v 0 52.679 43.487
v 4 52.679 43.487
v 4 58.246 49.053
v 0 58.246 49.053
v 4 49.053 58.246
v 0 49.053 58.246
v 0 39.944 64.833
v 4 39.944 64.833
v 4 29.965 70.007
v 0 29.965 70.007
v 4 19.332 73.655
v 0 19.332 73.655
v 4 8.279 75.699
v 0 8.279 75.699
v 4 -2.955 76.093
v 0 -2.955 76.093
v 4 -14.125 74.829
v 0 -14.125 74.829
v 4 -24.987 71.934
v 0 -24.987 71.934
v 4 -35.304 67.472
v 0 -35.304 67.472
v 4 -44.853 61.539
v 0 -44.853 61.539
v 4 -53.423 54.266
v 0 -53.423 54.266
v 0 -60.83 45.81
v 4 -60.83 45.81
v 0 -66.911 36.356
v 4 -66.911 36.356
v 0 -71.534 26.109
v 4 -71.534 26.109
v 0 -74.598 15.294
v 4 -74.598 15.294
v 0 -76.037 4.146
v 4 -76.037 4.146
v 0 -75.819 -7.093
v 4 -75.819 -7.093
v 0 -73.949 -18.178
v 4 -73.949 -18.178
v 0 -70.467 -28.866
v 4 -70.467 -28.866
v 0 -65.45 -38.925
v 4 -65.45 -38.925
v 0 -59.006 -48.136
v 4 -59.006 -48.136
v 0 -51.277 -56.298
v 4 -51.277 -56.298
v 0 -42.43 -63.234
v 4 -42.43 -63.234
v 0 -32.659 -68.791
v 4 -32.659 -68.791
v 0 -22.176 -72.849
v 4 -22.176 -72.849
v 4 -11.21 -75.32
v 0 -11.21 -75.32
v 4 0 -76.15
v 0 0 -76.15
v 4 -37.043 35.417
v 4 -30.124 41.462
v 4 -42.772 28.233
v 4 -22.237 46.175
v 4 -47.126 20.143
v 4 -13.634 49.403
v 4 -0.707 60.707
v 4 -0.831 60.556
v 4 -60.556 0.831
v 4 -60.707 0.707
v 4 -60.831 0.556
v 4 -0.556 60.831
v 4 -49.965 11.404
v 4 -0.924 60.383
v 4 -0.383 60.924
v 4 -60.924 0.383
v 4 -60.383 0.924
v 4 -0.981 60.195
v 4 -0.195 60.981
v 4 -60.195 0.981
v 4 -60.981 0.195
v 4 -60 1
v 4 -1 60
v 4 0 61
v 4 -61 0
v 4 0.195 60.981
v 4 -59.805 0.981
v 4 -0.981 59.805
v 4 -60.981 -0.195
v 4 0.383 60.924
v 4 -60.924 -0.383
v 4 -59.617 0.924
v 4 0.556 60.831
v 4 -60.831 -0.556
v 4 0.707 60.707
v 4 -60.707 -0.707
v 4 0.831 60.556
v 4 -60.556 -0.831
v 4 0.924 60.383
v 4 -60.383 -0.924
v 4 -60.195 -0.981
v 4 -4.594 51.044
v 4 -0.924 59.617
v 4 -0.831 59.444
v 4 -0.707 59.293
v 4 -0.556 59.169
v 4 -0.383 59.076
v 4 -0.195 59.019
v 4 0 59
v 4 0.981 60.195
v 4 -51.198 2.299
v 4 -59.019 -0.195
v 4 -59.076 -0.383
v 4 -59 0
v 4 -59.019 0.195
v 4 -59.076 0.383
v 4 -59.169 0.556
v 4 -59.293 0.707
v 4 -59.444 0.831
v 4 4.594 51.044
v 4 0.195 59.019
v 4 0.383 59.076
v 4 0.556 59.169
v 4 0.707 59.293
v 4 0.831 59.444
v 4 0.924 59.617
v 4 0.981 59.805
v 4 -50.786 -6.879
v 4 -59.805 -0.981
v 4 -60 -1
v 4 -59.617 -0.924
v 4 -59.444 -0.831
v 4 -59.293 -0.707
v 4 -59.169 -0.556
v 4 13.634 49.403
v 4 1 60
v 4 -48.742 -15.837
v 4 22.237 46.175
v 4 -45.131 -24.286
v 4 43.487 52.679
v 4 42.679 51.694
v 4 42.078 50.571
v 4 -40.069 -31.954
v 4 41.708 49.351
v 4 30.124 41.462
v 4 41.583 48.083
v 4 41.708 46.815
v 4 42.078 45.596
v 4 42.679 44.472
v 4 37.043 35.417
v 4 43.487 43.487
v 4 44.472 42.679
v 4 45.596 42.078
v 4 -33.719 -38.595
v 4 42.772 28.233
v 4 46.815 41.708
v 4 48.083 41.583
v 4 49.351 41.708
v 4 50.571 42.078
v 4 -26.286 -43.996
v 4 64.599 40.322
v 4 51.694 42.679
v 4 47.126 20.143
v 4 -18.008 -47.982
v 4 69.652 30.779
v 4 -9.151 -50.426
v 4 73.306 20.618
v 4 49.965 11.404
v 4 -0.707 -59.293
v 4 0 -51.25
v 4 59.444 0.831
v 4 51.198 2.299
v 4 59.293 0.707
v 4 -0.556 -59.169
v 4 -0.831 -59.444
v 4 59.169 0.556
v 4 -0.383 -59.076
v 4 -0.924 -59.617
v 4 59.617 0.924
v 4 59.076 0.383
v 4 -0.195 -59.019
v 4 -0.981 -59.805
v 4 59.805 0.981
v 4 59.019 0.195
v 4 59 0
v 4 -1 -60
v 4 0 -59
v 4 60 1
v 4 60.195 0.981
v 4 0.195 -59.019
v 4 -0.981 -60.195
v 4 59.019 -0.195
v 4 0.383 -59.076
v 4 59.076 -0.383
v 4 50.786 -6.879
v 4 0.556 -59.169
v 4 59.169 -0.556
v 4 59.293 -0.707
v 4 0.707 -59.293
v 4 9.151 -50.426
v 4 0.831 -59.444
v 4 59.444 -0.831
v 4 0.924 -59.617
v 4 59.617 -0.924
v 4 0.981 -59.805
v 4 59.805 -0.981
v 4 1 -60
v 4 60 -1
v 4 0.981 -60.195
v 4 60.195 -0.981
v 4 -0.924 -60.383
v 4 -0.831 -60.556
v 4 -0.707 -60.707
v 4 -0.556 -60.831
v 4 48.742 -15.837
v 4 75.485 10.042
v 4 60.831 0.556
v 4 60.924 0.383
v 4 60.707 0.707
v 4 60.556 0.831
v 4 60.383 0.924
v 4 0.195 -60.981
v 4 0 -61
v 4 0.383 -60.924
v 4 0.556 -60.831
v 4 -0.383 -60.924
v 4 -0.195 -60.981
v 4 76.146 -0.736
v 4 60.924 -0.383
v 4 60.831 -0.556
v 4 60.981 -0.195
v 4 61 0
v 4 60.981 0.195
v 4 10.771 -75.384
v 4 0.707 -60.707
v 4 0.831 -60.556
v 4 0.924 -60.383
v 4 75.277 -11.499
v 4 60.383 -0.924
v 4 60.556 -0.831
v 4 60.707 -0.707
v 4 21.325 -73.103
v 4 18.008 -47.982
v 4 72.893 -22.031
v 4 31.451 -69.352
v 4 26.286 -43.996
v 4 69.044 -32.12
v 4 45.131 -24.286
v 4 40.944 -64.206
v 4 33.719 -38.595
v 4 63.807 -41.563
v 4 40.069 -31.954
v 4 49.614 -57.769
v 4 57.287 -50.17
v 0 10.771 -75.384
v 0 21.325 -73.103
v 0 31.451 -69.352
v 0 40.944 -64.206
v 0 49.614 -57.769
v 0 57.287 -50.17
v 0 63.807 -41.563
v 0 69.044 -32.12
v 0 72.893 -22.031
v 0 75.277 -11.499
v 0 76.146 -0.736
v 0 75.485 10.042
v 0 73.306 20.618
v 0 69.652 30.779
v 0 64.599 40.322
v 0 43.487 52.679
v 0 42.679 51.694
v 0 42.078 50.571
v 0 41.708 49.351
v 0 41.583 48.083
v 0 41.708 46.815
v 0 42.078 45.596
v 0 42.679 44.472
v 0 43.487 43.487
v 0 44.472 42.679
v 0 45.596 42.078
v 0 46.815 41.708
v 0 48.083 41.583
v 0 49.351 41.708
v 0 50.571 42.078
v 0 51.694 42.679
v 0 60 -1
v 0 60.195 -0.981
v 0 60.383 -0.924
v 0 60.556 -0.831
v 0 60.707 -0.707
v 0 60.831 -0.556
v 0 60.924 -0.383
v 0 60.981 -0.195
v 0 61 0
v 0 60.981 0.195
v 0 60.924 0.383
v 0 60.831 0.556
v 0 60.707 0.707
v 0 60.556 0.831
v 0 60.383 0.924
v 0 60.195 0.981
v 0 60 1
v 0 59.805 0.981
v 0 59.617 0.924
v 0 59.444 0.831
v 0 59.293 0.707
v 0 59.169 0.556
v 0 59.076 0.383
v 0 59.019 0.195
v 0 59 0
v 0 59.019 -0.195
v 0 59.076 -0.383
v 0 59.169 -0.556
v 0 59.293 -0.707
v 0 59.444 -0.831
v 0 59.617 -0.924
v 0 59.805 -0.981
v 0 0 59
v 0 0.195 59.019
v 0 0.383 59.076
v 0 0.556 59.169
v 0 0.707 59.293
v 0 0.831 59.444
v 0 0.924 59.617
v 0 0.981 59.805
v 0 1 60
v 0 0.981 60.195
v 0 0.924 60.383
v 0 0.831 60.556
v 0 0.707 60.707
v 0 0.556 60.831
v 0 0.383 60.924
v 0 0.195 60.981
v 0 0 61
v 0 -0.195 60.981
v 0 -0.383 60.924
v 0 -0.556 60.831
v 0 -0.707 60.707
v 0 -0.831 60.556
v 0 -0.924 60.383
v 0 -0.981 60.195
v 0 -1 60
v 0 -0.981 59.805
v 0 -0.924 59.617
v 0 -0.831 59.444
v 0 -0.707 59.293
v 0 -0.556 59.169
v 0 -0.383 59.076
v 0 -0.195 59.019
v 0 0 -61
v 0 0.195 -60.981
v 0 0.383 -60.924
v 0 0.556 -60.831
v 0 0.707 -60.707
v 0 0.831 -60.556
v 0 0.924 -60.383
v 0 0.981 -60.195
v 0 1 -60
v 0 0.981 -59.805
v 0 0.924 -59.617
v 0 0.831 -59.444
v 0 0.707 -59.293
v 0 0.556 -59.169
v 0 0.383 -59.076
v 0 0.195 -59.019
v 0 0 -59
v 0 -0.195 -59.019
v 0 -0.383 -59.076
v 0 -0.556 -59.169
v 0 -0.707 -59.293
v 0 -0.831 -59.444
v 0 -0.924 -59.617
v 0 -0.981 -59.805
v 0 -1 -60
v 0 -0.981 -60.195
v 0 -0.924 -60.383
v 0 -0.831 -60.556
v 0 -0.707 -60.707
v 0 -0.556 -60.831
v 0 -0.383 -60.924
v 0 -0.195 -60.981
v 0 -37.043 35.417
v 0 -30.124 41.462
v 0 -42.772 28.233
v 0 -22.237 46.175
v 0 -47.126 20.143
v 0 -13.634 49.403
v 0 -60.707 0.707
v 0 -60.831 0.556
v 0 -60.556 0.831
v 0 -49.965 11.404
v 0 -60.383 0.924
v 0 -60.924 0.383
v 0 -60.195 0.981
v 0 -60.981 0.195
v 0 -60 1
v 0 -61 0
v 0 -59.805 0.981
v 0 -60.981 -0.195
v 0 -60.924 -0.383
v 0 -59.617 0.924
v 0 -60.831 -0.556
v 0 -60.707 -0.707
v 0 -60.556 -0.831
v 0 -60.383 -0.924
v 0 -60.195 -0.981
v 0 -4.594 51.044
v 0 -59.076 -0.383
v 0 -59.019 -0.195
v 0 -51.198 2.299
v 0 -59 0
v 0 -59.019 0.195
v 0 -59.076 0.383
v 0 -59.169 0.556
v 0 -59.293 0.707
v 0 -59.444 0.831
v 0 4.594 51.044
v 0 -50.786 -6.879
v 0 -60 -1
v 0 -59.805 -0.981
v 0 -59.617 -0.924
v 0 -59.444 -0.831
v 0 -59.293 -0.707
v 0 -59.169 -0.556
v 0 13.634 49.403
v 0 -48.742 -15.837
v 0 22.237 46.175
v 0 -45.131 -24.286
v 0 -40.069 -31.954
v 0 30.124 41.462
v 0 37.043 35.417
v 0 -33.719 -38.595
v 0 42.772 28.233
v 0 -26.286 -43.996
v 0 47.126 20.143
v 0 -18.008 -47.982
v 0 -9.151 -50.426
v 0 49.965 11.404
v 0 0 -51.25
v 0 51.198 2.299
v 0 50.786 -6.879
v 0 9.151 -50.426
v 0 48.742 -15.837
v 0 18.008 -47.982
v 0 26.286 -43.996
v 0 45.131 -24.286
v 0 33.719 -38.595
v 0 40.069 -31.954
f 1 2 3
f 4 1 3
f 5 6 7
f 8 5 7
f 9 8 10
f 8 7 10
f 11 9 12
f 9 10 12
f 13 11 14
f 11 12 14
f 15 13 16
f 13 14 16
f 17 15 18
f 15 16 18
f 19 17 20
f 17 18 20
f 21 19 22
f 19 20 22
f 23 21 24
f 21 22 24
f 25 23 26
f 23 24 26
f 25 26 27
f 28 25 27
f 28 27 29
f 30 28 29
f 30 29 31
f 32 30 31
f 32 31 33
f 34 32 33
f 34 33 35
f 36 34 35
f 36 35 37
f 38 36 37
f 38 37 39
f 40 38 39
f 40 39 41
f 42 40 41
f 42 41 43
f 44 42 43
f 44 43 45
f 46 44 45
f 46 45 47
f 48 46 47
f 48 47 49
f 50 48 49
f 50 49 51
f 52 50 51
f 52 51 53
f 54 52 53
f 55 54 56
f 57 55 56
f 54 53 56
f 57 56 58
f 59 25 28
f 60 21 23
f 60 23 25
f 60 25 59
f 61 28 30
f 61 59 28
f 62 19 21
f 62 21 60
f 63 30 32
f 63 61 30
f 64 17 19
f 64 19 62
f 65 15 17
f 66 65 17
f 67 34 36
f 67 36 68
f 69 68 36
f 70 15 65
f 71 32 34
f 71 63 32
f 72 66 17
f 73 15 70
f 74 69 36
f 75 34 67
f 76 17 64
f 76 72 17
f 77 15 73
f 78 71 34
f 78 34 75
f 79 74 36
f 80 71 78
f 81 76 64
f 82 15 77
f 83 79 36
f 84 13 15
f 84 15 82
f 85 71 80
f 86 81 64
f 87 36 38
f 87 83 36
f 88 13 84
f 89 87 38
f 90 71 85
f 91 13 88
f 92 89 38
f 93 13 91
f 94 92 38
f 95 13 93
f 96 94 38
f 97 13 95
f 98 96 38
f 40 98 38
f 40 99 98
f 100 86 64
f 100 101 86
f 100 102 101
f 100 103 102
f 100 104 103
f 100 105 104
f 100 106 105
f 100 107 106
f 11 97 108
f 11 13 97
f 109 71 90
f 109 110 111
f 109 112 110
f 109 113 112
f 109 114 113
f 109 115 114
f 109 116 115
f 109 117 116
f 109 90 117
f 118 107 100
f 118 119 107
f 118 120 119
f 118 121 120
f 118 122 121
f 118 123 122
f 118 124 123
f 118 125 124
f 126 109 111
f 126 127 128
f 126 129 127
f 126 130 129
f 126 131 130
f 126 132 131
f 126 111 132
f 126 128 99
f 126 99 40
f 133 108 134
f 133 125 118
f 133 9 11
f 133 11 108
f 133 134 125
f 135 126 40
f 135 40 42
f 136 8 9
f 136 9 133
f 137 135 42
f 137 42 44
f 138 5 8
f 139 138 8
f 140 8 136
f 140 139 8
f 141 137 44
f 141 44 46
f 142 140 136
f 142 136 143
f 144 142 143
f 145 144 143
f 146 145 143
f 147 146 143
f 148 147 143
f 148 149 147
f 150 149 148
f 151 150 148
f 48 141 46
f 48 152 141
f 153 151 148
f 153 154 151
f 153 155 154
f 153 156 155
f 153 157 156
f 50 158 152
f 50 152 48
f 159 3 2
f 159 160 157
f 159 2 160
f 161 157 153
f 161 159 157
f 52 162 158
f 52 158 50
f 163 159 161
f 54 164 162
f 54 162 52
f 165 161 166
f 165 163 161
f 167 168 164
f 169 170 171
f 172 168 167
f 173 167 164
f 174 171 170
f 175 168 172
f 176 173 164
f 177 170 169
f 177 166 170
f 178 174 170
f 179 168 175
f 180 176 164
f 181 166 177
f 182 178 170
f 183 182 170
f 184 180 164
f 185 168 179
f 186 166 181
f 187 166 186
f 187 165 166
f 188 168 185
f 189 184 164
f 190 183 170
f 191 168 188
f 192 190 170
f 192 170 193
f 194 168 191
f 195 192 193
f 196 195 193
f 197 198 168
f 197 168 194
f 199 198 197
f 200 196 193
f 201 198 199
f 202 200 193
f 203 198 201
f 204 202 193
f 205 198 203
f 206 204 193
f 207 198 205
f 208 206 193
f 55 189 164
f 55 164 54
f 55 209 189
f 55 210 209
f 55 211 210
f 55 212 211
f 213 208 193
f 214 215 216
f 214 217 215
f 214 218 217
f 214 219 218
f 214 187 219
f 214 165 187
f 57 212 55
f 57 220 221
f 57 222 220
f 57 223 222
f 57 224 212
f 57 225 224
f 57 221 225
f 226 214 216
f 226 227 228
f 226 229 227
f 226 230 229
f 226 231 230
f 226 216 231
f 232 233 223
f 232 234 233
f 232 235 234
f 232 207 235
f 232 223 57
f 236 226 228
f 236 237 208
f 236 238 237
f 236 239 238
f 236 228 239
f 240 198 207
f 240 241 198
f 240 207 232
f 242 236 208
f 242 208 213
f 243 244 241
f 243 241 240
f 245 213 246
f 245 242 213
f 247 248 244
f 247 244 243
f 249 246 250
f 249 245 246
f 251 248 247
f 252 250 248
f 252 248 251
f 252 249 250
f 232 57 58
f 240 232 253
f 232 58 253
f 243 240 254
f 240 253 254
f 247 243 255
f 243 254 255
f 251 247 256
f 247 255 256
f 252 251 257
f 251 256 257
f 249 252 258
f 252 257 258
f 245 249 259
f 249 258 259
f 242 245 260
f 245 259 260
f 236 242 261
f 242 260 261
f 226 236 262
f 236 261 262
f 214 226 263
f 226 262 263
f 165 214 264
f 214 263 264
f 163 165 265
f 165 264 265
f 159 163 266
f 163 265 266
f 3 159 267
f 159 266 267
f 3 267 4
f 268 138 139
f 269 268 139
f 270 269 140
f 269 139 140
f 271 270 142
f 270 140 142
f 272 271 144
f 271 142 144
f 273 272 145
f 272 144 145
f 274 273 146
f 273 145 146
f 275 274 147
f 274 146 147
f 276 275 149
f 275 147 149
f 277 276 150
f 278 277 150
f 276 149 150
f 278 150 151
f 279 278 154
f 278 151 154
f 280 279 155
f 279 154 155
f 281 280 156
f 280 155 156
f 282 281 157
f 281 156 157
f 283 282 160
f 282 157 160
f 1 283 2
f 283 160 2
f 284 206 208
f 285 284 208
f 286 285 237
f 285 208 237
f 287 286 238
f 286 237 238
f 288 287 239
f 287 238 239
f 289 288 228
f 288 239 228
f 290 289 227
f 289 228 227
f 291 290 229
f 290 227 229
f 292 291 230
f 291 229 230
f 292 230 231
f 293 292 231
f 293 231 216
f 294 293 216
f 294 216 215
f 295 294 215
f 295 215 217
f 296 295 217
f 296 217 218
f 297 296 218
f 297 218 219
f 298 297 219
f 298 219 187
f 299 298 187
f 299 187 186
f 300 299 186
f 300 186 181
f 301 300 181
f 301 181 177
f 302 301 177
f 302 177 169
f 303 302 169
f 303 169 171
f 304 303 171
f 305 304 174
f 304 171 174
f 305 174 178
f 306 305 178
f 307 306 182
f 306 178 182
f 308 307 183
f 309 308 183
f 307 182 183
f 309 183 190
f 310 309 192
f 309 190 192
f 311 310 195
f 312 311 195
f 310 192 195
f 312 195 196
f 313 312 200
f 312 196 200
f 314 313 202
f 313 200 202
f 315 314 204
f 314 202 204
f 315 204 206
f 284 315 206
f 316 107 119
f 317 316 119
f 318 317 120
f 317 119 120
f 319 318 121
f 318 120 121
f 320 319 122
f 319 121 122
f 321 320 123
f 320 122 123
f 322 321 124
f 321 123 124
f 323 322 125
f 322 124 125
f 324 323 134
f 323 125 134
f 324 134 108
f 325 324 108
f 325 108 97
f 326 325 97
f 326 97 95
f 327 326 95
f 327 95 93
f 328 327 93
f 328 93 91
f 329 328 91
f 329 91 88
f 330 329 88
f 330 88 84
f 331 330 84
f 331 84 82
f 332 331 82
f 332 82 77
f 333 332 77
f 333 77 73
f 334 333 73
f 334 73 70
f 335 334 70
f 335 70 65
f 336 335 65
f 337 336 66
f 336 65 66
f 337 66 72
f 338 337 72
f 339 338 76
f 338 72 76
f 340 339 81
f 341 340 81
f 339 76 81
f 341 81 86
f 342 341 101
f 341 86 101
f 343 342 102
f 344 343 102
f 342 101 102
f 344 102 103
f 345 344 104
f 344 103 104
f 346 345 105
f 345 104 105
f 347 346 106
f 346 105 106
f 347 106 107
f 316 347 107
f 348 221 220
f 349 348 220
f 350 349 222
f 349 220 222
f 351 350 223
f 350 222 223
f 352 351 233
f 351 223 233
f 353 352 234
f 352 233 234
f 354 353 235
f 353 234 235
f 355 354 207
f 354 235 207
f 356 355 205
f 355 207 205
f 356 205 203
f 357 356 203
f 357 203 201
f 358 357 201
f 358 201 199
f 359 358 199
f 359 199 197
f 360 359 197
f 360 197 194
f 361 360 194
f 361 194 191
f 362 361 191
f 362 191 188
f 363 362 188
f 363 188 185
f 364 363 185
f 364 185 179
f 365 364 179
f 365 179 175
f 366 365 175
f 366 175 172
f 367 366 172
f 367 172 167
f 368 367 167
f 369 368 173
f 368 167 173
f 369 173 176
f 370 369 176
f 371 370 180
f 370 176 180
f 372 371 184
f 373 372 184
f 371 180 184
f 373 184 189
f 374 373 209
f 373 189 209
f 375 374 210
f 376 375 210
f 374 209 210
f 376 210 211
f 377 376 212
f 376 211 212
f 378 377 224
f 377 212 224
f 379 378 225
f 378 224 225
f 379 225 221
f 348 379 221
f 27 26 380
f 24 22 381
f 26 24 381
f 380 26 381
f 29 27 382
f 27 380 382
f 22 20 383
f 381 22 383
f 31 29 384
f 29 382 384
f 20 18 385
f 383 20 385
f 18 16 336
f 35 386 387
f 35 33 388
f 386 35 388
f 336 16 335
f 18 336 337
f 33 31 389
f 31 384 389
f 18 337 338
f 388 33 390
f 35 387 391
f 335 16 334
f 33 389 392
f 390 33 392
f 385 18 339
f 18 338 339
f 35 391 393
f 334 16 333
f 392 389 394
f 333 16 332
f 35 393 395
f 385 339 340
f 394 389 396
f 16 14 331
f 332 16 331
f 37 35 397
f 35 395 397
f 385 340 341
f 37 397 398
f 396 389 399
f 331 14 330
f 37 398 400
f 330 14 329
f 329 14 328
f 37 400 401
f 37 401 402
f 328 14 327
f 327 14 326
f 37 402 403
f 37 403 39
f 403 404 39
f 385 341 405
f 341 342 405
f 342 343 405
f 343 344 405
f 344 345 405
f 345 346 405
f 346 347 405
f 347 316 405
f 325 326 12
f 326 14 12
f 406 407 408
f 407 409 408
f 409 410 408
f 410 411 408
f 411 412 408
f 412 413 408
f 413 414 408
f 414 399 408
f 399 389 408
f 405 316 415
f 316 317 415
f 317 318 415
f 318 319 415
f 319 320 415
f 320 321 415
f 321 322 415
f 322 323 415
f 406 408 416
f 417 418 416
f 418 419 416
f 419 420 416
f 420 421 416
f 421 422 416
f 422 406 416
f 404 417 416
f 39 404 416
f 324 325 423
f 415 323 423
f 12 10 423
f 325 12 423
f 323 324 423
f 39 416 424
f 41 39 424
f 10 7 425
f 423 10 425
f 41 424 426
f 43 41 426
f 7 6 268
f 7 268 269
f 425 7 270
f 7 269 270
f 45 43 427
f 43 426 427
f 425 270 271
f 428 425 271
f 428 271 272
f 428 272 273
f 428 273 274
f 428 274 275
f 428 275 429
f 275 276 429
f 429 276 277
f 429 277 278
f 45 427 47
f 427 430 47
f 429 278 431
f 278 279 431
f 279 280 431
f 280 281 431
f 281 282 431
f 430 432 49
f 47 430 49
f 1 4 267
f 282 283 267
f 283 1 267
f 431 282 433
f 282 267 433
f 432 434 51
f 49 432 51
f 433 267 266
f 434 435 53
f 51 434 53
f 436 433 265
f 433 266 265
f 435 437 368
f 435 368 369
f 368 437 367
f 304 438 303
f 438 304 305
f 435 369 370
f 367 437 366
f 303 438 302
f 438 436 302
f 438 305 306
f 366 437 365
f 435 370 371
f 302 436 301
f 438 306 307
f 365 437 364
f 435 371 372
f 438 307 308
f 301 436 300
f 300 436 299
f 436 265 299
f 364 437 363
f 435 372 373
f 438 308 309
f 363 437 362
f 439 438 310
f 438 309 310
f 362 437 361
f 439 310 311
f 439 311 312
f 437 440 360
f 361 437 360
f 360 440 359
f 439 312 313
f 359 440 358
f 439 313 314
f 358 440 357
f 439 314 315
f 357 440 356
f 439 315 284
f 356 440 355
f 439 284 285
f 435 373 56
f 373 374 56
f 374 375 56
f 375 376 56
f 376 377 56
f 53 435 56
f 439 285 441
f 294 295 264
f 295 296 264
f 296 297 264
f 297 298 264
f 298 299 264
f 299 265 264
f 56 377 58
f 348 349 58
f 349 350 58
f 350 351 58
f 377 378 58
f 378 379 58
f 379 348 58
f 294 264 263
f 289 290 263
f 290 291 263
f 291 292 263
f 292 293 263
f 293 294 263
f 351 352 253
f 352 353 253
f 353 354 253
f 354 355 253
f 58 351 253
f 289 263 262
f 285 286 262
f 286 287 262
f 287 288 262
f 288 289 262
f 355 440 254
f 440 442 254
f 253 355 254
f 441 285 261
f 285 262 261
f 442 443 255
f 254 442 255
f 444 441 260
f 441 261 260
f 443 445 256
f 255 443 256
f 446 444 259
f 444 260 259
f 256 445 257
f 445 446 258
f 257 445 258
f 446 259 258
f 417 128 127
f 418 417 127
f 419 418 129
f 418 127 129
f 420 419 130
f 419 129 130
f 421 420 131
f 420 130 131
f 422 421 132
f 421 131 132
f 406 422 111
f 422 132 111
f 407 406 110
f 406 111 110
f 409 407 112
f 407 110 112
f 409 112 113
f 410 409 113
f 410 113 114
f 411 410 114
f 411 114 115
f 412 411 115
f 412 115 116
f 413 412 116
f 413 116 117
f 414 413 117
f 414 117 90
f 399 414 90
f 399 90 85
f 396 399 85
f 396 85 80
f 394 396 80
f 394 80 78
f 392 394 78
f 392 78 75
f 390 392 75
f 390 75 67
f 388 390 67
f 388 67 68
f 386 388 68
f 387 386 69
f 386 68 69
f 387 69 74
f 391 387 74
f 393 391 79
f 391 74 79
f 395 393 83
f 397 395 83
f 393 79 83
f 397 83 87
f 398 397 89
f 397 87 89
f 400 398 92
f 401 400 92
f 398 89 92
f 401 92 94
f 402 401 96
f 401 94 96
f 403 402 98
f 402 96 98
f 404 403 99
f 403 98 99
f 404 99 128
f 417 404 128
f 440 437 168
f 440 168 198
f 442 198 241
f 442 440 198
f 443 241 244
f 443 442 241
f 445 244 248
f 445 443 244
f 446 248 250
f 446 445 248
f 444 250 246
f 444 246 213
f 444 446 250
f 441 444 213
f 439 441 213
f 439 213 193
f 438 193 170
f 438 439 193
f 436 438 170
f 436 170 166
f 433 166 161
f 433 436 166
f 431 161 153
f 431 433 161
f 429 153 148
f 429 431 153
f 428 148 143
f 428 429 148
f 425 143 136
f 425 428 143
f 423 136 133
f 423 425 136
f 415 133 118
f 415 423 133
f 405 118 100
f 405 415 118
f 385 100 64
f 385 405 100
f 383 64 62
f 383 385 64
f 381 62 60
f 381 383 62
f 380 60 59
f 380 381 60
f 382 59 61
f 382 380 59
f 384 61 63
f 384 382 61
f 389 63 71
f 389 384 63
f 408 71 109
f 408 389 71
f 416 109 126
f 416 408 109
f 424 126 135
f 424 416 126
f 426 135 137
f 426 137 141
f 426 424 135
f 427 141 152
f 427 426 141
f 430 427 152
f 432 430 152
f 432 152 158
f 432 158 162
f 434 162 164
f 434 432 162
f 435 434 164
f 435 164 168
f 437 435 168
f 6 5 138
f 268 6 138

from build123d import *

# Parameters (mm, degrees)
ESQUISSE1_R        = 76.15
ESQUISSE1_R_2      = 51.25
BOSS_EXTRU_1_DEPTH = 4
SKETCH1_R          = 1
AIR_VENTS_DEPTH    = 108.766622848
CUT_EXTRUDE1_DEPTH = 10


with BuildPart() as part:
    # Esquisse1 → Boss.-Extru.1 (new body)
    with BuildSketch(Plane(origin=(0, 0, 0), x_dir=(0, 0, -1), z_dir=(1, 0, 0))):
        Circle(ESQUISSE1_R)
        Circle(ESQUISSE1_R_2, mode=Mode.SUBTRACT)
    extrude(amount=BOSS_EXTRU_1_DEPTH)

    # Sketch1 → air vents (cut, through all)
    with BuildSketch(Plane(origin=(4, 0, 0), x_dir=(0, 0, -1), z_dir=(1, 0, 0))):
        with Locations((0, 60)):
            Circle(SKETCH1_R)
        with Locations((60, 0)):
            Circle(SKETCH1_R)
        with Locations((0, -60)):
            Circle(SKETCH1_R)
        with Locations((-60, 0)):
            Circle(SKETCH1_R)
    extrude(amount=-AIR_VENTS_DEPTH, mode=Mode.SUBTRACT)

    # Sketch2 → Cut-Extrude1 (cut)
    with BuildSketch(Plane(origin=(4, 0, 0), x_dir=(0, 0, -1), z_dir=(1, 0, 0))):
        with BuildLine():
            Line((-43.487067043, 52.679455198), (-81.600352415, 90.79274057))
            Line((-81.600352415, 90.79274057), (-92.273966974, 83.081578819))
            Line((-92.273966974, 83.081578819), (-52.679455198, 43.487067043))
            ThreePointArc((-52.679455198, 43.487067043), (-43.487067043, 43.487067043), (-43.487067043, 52.679455198))
        make_face()
    extrude(amount=-CUT_EXTRUDE1_DEPTH, mode=Mode.SUBTRACT)


solid = part.part
